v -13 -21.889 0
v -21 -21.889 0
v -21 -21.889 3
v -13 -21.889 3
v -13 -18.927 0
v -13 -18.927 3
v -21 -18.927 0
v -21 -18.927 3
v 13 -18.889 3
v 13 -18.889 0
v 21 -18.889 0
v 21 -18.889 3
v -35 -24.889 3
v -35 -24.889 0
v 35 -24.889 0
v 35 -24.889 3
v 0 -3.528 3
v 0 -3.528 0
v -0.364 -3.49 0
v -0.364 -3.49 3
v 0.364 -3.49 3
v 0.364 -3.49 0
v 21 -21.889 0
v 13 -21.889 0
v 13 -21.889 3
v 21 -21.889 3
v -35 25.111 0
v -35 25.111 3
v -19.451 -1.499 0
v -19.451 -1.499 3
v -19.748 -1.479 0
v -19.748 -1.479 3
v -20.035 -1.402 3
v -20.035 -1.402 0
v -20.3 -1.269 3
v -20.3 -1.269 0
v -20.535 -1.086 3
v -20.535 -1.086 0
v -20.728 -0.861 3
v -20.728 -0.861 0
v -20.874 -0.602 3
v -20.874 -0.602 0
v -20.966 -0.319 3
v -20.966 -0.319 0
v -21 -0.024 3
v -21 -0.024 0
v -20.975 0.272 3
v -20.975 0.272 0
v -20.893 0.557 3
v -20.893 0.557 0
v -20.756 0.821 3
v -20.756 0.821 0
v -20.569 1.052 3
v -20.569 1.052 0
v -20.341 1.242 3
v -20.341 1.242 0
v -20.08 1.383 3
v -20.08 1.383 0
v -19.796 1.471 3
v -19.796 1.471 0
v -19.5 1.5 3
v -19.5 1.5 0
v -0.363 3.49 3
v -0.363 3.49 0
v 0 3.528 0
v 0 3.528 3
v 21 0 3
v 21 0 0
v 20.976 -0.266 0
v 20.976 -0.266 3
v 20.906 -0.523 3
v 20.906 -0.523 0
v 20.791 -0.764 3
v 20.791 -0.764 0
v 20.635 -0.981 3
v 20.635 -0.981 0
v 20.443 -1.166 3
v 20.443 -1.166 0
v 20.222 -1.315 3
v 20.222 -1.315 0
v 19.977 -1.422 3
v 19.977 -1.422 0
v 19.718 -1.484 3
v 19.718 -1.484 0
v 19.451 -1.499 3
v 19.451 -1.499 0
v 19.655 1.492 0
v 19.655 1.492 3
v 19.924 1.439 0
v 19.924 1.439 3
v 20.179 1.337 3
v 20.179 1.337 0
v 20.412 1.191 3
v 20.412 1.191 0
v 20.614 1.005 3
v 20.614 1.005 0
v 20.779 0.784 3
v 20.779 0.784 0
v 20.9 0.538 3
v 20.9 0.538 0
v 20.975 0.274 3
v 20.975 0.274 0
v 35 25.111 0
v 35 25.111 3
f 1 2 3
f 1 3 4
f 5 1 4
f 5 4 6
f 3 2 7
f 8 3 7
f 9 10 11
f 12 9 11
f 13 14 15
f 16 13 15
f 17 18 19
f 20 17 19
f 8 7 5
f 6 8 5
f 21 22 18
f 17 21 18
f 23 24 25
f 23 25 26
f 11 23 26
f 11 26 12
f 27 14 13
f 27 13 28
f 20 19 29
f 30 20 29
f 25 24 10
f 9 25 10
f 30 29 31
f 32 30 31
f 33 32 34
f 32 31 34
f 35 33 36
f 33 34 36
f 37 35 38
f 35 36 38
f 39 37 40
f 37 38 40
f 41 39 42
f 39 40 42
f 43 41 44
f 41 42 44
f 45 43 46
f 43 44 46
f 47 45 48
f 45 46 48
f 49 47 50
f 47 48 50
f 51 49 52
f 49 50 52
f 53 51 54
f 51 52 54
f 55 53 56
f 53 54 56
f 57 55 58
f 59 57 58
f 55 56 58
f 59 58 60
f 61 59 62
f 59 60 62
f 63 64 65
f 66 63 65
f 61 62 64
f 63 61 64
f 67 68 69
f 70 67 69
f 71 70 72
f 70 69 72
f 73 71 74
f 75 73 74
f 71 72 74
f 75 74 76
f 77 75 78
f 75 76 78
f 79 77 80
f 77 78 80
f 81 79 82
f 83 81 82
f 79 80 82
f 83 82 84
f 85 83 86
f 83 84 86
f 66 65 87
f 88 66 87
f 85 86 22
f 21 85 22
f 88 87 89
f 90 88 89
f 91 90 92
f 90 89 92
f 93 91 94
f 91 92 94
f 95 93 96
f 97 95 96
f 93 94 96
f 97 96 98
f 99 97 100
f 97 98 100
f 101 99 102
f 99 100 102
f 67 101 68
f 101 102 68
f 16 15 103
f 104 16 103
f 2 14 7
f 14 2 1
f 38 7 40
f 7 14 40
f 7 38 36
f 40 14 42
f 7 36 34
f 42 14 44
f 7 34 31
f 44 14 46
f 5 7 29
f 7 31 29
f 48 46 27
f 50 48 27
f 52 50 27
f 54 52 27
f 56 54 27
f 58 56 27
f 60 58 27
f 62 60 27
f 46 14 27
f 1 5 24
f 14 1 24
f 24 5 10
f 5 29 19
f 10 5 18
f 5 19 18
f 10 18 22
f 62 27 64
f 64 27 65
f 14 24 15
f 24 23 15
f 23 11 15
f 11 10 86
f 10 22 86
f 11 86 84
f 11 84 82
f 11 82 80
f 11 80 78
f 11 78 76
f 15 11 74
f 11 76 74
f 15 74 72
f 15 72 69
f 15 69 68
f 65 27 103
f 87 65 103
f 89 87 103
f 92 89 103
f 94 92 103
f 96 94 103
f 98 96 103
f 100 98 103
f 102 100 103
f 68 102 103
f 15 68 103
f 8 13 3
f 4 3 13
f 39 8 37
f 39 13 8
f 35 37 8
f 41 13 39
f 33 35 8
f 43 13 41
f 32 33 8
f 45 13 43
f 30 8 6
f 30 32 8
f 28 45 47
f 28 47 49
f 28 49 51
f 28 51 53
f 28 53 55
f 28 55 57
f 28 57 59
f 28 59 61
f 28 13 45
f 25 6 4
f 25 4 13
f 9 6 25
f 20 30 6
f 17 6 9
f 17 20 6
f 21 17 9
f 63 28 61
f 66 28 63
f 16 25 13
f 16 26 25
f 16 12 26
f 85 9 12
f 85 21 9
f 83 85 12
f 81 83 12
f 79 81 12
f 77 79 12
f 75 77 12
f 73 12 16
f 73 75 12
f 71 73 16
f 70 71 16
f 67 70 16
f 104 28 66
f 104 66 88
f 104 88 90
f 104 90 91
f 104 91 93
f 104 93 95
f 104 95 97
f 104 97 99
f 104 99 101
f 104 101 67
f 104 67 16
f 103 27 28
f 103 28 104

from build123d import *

# Parameters (mm, degrees)
F0_W     = 70
F0_H     = 50
F0_W_2   = 8
F0_H_2   = 2.962767
F0_H_3   = 3
F1_DEPTH = 3


with BuildPart() as f1:
    # F0 (on Top) → F1 (new body)
    with BuildSketch(Plane.XY):
        with Locations((0, 0.110523)):
            Rectangle(F0_W, F0_H)
        with Locations((-17, -20.408093)):
            Rectangle(F0_W_2, F0_H_2, mode=Mode.SUBTRACT)
        with Locations((17, -20.389477)):
            Rectangle(F0_W_2, F0_H_3, mode=Mode.SUBTRACT)
        with BuildLine():
            ThreePointArc((-19.451462, -1.499214), (-20.999804, -0.024272), (-19.5, 1.5))
            Line((-19.5, 1.5), (-0.362987, 3.490252))
            Line((-0.362987, 3.490252), (0, 3.528003))
            Line((0, 3.528003), (19.654556, 1.492016))
            ThreePointArc((19.654556, 1.492016), (20.613964, 1.004531), (21, 0))
            ThreePointArc((21, 0), (20.543358, -1.077684), (19.451462, -1.499214))
            Line((19.451462, -1.499214), (0.364042, -3.490142))
            Line((0.364042, -3.490142), (0, -3.528114))
            Line((0, -3.528114), (-0.364042, -3.490142))
            Line((-0.364042, -3.490142), (-19.451462, -1.499214))
        make_face(mode=Mode.SUBTRACT)
    extrude(amount=F1_DEPTH)


solid = f1.part
